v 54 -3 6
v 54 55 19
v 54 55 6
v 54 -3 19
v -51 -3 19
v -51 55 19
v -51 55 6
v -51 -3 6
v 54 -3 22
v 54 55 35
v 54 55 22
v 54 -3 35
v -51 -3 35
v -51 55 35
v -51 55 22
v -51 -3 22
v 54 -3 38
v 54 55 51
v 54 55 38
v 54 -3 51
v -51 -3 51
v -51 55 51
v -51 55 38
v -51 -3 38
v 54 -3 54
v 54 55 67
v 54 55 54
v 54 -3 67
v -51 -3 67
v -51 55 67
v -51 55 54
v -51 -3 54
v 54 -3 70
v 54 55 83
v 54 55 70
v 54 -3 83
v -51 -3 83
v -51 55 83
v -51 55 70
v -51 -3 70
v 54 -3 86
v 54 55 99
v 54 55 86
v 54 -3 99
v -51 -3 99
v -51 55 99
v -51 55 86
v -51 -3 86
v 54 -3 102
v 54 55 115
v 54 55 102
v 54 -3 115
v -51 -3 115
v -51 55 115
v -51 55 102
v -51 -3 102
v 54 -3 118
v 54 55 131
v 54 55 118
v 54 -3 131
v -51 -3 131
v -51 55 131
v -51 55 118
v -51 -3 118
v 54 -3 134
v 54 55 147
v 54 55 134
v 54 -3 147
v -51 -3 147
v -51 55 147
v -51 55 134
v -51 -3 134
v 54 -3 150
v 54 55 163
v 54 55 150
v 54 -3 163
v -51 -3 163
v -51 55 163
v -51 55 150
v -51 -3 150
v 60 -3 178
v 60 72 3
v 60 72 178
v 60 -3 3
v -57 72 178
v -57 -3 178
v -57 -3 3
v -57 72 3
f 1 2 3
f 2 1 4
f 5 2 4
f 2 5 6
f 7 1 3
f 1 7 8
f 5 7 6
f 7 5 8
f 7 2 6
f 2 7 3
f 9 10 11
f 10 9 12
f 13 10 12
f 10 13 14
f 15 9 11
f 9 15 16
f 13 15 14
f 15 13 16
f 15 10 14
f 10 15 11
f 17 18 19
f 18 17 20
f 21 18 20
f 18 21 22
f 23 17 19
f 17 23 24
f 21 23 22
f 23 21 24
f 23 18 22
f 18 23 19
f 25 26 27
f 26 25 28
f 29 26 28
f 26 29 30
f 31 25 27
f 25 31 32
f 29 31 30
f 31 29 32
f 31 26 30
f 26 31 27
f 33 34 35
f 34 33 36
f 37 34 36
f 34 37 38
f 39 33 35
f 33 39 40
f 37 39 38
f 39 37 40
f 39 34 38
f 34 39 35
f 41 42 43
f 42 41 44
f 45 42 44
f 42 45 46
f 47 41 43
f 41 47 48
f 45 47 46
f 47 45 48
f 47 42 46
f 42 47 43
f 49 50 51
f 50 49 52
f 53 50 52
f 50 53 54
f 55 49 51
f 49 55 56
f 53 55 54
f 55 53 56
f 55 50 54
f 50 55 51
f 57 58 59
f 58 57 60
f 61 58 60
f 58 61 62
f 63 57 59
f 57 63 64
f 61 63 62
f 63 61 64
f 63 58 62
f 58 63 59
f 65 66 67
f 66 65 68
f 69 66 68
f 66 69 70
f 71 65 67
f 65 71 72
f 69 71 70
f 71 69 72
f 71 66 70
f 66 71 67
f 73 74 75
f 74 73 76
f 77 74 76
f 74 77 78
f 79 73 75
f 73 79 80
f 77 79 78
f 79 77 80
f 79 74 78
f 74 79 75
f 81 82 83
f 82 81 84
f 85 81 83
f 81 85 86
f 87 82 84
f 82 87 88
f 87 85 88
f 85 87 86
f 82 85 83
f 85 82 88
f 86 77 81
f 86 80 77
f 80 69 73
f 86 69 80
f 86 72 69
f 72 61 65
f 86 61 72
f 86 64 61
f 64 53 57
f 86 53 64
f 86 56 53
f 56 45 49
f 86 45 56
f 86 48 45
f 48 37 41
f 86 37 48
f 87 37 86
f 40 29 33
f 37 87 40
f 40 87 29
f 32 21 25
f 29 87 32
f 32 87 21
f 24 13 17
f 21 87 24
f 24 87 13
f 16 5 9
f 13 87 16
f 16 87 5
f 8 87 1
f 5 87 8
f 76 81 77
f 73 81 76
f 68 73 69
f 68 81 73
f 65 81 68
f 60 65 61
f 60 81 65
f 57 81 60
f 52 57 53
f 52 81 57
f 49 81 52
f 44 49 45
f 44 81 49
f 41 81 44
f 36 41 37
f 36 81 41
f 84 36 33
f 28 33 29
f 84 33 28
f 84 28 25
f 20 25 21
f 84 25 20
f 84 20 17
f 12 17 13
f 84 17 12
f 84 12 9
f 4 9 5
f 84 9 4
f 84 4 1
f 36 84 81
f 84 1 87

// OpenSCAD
difference() {
    translate([-57, -3, 3]) {
        scale([117, 75, 175]) {

            cube();
        }
    }

    union (){
        translate([-51, -5, 6]) {
            scale([105, 60 , 13])

                cube();
        }
        translate([-51, -5, 22]) {
            scale([105, 60 , 13])

                cube();
        }
        translate([-51, -5, 38]) {
            scale([105, 60 , 13])

                cube();
        }

        translate([-51, -5, 54]) {
            scale([105, 60 , 13])

                cube();
        }
        translate([-51, -5, 70]) {
            scale([105, 60 , 13])

                cube();
        }
        translate([-51, -5, 86]) {
            scale([105, 60 , 13])

                cube();
        }
        translate([-51, -5, 102]) {
            scale([105, 60 , 13])

                 cube();
        }
        translate([-51, -5, 118]) {
            scale([105, 60 , 13])

                cube();
        }
        translate([-51, -5, 134]) {
            scale([105, 60 , 13])

                cube();
        }

        translate([-51, -5, 150]) {
            scale([105, 60 , 13])

                cube();
        }

    }
}
